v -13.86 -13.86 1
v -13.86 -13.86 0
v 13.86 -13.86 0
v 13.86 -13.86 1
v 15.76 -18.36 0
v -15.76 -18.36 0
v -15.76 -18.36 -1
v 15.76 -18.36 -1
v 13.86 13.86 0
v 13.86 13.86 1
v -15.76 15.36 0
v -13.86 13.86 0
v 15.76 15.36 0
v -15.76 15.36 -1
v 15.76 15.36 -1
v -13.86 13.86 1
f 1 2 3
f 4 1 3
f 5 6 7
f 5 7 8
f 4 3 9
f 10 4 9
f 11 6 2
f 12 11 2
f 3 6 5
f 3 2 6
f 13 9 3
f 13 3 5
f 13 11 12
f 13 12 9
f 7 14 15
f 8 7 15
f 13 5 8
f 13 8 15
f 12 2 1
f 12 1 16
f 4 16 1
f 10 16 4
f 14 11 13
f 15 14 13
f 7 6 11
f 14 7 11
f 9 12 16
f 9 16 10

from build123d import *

# Parameters (mm, degrees)
EXTRUDE_1_DEPTH      = 1
EXTRUDE_1_DEPTH_BACK = 1
SKETCH_1_W           = 27.72
SKETCH_1_H           = 27.72
SKETCH_1_5_W         = 31.52
SKETCH_1_5_H         = 33.72
SKETCH_1_5_W_2       = 27.72
SKETCH_1_5_H_2       = 27.72
EXTRUDE_3_DEPTH      = 1


with BuildPart() as part:
    # 草图1 → 凸台-拉伸1 (new, two sides: drawn at the far end of the back side and taken through both)
    with BuildSketch(Plane.XY.offset(-EXTRUDE_1_DEPTH_BACK)):
        Rectangle(SKETCH_1_W, SKETCH_1_H)
    extrude(amount=EXTRUDE_1_DEPTH + EXTRUDE_1_DEPTH_BACK)

    # 草图1<5> → 凸台-拉伸3 (add)
    with BuildSketch(Plane.XY):
        with Locations((0, -1.5)):
            Rectangle(SKETCH_1_5_W, SKETCH_1_5_H)
        Rectangle(SKETCH_1_5_W_2, SKETCH_1_5_H_2, mode=Mode.SUBTRACT)
    extrude(amount=-EXTRUDE_3_DEPTH)


solid = part.part
